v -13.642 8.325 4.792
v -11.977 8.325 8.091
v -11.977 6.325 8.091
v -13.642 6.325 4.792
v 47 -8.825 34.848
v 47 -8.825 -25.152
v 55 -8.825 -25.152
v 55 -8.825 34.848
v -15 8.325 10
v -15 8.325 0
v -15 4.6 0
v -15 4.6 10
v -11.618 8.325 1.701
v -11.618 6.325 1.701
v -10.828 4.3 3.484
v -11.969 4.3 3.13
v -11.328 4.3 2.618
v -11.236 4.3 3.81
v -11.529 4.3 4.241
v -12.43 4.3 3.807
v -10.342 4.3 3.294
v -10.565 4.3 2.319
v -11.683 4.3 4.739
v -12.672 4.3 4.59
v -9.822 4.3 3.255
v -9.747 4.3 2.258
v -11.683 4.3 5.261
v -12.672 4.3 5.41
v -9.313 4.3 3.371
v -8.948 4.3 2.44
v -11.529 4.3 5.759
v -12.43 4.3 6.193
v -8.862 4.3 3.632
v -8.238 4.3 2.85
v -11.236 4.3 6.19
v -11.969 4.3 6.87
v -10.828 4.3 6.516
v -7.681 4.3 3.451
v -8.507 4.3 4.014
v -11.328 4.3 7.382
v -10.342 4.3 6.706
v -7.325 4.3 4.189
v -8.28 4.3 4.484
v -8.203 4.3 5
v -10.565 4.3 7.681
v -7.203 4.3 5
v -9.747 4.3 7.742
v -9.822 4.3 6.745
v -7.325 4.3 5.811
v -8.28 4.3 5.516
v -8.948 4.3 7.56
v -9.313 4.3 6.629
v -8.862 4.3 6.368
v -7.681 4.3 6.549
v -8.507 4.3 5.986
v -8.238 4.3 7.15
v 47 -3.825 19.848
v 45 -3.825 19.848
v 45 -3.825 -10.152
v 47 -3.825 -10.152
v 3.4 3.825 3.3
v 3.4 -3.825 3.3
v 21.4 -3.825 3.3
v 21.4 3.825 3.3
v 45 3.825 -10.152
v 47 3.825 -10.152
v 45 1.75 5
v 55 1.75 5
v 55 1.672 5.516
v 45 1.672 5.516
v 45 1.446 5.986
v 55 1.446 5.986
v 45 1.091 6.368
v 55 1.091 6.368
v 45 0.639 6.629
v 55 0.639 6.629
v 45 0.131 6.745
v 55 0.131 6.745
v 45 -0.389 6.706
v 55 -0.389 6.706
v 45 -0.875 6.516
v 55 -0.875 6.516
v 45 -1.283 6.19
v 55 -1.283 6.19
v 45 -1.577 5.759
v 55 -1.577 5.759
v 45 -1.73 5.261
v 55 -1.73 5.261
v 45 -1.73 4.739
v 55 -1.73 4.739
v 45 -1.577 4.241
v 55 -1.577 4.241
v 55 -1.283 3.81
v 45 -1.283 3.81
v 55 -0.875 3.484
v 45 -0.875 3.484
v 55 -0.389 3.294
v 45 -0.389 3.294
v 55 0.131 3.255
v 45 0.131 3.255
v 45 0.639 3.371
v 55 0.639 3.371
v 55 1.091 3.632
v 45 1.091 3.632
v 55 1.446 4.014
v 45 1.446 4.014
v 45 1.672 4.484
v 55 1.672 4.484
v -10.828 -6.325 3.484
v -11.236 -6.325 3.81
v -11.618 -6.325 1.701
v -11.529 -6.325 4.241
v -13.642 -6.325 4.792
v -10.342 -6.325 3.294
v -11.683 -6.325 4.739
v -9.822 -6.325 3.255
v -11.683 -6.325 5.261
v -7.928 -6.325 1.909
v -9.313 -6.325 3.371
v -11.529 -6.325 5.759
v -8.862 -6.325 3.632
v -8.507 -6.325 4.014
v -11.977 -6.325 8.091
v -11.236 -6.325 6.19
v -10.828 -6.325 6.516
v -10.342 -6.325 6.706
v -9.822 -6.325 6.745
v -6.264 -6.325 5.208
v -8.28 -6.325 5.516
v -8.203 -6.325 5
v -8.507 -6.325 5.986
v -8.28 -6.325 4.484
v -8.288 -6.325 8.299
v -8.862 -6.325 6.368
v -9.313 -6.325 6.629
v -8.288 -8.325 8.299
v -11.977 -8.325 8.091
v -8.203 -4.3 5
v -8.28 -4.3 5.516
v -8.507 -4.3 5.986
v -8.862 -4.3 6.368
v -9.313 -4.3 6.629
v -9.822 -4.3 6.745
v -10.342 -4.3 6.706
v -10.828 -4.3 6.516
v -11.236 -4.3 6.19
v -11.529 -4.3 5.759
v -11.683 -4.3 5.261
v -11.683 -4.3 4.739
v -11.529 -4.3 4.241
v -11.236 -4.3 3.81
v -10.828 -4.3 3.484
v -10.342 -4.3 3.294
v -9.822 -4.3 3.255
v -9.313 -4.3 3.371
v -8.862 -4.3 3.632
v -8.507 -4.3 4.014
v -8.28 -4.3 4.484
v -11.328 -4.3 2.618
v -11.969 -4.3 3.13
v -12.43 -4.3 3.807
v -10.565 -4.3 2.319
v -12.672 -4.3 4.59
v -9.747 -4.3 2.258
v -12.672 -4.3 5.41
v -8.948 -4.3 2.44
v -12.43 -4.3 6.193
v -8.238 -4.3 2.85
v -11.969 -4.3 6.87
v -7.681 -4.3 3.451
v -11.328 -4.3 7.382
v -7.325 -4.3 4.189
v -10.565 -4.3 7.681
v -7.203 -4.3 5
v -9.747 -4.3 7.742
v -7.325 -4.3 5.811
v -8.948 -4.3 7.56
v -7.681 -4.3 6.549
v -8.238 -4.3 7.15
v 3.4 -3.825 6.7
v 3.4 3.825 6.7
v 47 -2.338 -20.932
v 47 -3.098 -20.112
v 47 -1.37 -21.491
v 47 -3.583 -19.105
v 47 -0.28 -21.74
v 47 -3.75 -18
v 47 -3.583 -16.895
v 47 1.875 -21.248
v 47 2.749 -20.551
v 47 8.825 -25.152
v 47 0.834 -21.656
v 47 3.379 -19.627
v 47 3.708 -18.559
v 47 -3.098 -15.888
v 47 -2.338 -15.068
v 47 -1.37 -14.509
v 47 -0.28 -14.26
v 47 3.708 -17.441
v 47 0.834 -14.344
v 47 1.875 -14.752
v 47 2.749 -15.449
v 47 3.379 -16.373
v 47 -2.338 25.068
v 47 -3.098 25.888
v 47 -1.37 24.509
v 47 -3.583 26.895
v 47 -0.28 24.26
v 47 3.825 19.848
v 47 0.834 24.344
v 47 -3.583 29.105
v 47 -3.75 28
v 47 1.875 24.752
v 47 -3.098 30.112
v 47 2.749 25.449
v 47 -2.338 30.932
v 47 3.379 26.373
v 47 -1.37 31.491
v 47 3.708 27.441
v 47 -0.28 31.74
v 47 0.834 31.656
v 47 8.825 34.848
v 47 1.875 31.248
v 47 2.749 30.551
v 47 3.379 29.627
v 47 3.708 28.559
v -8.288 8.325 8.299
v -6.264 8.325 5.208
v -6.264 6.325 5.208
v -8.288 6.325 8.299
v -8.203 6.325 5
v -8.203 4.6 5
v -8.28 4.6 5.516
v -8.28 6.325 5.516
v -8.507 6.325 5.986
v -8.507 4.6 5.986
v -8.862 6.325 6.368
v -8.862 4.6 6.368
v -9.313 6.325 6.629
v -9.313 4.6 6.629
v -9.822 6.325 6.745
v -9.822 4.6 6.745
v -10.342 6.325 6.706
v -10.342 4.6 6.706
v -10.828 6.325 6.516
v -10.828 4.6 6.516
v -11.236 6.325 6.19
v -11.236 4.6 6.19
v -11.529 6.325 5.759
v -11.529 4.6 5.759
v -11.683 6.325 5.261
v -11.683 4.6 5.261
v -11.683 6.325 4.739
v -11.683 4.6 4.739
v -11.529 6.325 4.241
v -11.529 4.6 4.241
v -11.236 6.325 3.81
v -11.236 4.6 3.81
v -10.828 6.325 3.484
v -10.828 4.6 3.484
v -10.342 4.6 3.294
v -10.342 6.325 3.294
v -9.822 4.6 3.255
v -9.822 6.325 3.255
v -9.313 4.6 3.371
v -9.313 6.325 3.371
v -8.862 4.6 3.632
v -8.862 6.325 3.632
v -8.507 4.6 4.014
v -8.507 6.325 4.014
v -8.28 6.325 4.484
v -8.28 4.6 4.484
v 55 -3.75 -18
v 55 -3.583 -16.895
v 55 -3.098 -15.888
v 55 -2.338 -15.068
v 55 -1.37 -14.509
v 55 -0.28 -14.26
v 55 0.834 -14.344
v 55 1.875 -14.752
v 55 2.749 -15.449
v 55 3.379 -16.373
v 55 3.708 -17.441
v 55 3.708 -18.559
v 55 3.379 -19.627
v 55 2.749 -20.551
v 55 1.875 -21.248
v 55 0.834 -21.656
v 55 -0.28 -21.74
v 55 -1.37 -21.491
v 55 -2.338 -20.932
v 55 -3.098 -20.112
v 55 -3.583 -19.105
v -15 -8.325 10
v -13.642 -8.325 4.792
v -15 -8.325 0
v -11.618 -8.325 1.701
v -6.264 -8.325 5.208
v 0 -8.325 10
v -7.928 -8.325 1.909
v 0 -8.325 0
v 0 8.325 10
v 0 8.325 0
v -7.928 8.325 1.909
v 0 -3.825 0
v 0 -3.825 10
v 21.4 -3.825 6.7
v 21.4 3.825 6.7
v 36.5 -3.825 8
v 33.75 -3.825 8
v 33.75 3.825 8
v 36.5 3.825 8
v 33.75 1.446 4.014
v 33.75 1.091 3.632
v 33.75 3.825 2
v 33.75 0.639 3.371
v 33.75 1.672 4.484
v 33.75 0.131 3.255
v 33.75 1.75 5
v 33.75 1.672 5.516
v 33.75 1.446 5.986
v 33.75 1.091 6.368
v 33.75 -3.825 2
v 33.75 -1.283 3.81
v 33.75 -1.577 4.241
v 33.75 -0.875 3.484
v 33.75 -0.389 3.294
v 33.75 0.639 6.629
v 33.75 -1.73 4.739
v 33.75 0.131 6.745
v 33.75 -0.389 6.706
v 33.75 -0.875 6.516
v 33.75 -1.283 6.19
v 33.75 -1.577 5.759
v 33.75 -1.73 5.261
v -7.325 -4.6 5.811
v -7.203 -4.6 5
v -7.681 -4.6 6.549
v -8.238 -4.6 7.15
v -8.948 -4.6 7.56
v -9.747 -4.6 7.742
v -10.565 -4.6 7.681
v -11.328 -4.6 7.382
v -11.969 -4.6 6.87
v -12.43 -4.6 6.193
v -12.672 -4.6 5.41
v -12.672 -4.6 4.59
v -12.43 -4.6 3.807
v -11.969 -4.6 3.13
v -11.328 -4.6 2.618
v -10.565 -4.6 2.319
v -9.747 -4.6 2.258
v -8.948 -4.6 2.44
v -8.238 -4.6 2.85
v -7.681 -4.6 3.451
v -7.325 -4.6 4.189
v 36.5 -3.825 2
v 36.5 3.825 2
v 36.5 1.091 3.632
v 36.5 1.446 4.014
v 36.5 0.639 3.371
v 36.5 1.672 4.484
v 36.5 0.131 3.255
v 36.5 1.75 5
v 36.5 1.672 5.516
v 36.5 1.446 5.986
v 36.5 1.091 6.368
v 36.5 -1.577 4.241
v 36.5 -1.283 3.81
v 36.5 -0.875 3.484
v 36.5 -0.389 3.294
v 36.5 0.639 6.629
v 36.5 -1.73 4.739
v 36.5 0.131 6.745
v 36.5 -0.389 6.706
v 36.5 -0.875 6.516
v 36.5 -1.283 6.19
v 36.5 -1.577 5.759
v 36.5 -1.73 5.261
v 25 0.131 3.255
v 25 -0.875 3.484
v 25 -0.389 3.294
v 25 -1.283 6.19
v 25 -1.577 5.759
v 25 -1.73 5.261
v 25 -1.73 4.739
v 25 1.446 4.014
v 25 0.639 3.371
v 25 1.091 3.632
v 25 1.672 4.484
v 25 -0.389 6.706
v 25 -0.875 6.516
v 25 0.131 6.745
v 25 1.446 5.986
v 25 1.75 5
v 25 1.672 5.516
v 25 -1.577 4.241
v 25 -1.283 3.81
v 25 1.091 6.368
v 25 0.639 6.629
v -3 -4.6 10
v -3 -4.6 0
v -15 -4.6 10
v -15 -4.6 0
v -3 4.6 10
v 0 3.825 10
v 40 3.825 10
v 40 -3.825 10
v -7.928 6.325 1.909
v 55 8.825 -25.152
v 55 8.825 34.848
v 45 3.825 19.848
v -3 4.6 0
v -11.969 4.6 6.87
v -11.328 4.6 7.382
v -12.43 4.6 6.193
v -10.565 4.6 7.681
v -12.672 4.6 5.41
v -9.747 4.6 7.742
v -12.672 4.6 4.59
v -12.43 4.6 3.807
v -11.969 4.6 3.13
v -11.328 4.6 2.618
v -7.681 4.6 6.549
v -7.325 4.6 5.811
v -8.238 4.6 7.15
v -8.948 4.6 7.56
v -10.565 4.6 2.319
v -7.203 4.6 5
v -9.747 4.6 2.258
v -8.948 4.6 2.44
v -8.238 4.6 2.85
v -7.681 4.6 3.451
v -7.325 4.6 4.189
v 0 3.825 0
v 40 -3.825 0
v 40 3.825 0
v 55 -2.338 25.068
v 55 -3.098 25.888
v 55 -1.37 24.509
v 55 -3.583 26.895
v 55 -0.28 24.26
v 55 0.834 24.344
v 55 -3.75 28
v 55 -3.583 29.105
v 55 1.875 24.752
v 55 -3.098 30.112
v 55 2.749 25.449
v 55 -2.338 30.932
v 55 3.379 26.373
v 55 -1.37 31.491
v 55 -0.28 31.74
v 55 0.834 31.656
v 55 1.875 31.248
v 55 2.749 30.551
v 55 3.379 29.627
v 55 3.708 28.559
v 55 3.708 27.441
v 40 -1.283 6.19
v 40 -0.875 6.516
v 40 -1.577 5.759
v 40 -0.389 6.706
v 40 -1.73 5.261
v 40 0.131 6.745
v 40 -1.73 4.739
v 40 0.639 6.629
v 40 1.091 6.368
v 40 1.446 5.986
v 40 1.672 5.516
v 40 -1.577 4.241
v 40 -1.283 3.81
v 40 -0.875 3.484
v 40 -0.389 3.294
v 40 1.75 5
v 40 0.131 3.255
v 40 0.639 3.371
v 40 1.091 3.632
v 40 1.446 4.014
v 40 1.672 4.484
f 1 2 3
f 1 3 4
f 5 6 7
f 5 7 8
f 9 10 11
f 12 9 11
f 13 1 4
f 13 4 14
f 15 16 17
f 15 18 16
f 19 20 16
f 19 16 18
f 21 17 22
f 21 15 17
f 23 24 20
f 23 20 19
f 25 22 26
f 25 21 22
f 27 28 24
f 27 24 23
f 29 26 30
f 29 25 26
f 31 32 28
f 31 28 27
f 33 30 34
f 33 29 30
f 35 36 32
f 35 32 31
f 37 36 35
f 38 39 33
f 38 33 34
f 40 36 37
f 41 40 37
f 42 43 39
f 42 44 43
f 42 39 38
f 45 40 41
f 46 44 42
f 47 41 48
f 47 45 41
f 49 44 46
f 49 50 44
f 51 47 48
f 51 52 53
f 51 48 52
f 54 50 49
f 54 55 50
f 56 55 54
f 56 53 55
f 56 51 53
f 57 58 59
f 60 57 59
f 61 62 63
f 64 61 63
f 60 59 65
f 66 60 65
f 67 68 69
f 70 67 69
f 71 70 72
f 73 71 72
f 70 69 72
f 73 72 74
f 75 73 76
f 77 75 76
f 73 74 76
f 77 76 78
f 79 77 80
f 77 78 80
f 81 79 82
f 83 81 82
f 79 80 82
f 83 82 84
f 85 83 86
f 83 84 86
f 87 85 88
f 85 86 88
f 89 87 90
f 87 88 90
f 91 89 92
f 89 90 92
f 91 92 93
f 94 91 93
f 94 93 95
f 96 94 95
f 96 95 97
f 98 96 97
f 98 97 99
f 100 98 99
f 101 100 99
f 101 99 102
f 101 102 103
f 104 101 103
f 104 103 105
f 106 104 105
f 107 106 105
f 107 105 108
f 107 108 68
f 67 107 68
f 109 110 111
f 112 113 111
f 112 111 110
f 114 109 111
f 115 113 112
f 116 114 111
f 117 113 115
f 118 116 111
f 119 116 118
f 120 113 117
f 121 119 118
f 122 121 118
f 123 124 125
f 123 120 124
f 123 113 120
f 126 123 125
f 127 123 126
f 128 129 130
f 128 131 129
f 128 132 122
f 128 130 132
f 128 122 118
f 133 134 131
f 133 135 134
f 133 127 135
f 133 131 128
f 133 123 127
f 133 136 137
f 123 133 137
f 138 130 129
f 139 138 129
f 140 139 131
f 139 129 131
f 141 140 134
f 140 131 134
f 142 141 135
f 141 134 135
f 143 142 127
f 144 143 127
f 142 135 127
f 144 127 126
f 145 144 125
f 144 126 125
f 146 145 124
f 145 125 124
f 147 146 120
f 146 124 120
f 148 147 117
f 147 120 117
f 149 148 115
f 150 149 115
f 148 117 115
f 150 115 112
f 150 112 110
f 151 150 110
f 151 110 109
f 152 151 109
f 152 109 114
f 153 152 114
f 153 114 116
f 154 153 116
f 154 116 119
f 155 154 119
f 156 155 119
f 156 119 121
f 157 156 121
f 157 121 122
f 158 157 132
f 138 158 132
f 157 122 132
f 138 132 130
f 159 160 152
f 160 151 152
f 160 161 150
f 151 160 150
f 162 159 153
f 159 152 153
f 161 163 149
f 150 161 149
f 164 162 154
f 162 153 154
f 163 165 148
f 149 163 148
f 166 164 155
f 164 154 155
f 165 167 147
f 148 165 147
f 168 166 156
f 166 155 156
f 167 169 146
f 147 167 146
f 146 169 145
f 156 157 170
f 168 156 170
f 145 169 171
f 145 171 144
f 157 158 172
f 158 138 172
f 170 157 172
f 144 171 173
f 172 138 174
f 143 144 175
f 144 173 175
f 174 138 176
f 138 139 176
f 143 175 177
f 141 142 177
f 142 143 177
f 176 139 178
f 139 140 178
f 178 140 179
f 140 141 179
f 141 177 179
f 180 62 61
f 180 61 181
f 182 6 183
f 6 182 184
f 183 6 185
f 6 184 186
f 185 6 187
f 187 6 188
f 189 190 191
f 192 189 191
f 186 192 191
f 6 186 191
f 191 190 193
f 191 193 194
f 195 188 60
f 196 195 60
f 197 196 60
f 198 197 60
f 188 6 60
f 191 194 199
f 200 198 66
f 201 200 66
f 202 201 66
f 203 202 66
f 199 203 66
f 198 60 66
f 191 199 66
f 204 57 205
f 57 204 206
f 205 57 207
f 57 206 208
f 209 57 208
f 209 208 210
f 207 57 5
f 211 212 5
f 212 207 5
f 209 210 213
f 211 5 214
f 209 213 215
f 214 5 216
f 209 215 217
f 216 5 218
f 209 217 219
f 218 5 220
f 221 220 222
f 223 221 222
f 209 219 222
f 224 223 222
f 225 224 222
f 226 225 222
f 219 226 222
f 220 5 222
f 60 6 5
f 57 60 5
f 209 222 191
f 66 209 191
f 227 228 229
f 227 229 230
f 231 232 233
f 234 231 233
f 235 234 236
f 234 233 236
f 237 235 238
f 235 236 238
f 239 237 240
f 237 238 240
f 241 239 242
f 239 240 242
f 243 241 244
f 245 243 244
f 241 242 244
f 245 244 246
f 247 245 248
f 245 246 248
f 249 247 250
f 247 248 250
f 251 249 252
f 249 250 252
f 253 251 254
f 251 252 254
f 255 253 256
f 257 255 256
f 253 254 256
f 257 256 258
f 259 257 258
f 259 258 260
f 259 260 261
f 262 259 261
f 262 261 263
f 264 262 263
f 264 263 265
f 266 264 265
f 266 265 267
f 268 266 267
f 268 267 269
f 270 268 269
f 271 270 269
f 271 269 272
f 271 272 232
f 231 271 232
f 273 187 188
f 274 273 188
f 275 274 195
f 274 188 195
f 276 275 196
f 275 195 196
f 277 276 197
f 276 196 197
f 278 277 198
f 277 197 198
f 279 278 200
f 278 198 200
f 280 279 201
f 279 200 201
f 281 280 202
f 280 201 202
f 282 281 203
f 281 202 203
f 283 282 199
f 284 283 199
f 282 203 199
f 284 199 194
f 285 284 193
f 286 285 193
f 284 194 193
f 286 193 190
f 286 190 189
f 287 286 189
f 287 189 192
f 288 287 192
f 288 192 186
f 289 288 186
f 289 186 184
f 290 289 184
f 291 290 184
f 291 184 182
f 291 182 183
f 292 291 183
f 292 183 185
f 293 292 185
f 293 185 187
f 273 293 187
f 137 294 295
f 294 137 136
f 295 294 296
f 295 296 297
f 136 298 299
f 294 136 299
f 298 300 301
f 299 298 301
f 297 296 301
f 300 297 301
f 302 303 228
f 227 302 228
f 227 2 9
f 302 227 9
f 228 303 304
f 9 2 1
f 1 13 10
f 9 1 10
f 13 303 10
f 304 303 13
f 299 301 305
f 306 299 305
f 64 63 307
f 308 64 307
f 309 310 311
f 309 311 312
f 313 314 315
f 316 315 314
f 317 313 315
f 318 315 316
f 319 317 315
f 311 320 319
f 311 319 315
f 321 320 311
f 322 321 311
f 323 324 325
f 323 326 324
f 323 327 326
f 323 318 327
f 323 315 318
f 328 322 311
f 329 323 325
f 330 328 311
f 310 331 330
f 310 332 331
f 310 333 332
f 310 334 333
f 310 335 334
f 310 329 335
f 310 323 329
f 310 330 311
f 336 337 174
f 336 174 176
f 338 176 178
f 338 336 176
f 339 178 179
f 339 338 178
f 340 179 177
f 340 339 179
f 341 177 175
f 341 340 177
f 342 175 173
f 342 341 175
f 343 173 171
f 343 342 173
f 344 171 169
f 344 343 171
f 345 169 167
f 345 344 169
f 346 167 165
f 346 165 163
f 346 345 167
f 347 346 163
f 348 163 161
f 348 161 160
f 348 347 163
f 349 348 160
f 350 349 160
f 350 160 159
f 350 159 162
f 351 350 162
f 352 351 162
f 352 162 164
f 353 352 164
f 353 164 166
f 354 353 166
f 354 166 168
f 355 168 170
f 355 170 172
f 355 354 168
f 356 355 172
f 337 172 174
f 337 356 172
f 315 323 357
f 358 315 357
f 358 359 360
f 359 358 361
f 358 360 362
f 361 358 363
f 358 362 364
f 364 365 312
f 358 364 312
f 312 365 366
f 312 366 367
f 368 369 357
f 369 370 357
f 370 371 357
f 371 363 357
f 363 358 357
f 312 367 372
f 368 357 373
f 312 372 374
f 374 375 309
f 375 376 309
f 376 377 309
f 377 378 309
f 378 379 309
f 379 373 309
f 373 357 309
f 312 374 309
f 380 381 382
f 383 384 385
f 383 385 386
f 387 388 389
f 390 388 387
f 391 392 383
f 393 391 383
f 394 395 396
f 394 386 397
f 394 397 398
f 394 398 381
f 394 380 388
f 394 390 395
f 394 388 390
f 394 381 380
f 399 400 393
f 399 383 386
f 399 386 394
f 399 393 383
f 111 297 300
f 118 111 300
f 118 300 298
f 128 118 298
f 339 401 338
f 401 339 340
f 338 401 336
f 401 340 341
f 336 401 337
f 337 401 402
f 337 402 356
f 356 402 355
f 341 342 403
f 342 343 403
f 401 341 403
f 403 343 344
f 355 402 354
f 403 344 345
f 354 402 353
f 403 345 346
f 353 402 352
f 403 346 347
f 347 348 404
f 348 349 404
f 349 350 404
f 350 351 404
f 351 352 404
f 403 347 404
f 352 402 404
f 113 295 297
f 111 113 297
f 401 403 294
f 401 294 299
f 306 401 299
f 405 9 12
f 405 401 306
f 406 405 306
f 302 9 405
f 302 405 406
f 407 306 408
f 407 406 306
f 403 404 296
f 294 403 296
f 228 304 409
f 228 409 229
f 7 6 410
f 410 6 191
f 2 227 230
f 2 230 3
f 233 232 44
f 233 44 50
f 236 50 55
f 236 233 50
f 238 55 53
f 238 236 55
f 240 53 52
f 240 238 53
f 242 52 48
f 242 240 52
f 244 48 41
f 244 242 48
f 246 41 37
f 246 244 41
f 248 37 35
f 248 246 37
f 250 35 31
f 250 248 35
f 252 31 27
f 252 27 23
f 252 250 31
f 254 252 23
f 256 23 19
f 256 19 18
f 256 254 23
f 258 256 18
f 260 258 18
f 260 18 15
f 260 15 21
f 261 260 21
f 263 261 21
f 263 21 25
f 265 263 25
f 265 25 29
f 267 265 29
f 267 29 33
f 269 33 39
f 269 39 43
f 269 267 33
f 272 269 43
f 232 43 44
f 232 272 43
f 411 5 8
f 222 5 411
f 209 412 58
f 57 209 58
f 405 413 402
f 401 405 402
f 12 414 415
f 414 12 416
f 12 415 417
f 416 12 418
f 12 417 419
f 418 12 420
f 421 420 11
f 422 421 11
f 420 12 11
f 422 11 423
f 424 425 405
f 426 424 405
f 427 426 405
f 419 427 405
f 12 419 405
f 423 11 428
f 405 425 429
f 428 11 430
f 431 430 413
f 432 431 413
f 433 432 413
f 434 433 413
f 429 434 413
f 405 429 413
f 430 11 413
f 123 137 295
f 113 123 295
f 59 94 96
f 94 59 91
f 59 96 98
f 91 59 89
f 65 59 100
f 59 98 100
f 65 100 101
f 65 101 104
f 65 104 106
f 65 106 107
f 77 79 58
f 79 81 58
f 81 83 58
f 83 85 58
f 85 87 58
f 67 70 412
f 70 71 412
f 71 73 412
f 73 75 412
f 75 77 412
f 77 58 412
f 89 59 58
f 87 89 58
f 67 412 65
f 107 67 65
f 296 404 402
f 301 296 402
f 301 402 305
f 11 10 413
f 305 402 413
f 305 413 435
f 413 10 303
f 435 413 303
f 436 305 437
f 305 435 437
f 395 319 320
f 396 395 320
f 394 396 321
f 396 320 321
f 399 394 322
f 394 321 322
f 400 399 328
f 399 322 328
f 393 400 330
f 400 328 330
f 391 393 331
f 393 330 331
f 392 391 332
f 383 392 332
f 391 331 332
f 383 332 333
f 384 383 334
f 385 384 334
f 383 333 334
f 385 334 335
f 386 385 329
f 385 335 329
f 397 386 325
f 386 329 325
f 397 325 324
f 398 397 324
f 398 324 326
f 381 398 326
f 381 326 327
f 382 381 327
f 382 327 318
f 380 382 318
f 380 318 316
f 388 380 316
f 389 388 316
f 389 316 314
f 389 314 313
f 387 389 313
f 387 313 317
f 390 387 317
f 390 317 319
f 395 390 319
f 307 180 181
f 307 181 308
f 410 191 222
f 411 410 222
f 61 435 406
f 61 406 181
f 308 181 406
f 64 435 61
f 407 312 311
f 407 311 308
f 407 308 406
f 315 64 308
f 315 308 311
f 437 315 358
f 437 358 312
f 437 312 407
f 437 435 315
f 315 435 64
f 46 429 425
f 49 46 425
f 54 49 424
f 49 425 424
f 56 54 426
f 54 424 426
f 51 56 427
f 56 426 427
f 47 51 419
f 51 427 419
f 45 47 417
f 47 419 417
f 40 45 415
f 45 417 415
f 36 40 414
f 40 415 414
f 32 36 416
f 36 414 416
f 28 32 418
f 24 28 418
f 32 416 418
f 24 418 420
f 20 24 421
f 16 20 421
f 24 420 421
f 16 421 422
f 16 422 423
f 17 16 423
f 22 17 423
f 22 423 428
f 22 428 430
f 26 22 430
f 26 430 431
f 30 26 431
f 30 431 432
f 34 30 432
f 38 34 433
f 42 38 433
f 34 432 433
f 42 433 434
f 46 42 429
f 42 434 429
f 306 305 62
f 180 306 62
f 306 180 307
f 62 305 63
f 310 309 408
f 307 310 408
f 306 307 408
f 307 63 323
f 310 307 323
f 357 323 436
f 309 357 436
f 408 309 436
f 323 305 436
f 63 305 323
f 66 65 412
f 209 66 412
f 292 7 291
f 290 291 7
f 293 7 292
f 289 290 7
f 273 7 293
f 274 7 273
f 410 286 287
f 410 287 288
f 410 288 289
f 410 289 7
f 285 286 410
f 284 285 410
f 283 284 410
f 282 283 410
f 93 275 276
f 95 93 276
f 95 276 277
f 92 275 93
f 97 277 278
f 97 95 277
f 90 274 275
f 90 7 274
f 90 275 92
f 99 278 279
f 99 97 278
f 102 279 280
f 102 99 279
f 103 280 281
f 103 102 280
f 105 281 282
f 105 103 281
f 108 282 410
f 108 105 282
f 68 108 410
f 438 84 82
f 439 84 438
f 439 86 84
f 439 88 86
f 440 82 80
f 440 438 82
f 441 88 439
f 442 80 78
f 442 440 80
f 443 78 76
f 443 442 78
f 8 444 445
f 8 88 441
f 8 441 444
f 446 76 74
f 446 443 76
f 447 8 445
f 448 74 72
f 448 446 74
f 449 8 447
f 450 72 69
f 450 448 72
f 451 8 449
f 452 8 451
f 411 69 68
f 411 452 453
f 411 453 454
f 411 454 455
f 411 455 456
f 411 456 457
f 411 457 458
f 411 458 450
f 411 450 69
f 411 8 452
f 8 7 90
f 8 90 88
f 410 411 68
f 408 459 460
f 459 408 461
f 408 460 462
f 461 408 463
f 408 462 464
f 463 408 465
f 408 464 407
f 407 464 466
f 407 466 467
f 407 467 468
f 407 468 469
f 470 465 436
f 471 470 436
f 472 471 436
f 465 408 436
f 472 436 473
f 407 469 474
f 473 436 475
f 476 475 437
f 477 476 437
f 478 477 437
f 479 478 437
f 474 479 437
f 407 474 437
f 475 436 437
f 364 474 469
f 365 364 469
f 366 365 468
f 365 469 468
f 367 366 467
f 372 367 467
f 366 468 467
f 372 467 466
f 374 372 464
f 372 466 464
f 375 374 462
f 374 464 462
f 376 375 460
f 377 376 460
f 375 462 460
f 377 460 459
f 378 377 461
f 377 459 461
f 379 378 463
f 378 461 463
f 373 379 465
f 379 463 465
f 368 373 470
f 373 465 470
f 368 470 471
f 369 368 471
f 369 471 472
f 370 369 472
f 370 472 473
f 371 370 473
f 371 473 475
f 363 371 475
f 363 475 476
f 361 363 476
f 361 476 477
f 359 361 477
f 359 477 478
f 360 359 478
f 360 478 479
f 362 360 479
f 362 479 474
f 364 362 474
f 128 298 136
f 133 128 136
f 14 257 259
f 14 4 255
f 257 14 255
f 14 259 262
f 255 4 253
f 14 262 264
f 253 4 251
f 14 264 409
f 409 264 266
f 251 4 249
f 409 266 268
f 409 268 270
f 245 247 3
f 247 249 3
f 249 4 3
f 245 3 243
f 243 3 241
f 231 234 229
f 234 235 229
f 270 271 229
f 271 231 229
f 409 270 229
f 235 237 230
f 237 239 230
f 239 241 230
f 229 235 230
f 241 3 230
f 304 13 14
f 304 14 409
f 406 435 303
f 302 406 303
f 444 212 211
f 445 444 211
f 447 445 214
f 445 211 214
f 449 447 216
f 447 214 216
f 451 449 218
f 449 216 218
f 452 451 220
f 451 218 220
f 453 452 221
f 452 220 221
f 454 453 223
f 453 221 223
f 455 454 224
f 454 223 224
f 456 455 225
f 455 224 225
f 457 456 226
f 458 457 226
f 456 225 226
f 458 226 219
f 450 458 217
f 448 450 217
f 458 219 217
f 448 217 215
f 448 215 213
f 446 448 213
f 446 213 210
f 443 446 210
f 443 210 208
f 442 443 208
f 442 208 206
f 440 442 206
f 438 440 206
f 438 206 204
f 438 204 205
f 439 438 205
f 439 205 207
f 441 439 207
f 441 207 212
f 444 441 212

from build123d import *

# Parameters (mm, degrees)
F0_W      = 40
F0_H      = 3.825
F1_DEPTH  = 10
F2_R      = 1.75
F3_DEPTH  = 16.651
F4_W      = 18
F4_H      = 3.4
F4_W_2    = 2.75
F4_H_2    = 6
F5_DEPTH  = 12.151
F6_R      = 1.75
F7_DEPTH  = 15
F10_DEPTH = 2
F11_W     = 17.65
F11_H     = 60
F12_DEPTH = 8
F13_R     = 1.75
F14_DEPTH = 70.001
F15_R     = 2.75
F15_R_2   = 1.75
F16_DEPTH = 0.3
F17_R     = 1.75
F18_DEPTH = 2
F19_R     = 3.75
F20_DEPTH = 15


# Not quite as in the source:
# - a pattern or mirror of a feature is missing from the dataset's text; its kind, count and spacing are read off the source's solid


with BuildPart() as f1:
    # F0 (on Top) → F1 (new body)
    with BuildSketch(Plane.XY):
        Polygon((0, -3.825), (0, 0), (-3, 0), (-3, -4.6), (-15, -4.6), (-15, -8.325), (0, -8.325), align=None)
        Polygon((-3, 0), (0, 0), (0, 3.825), (0, 8.325), (-15, 8.325), (-15, 4.6), (-3, 4.6), align=None)
        with Locations((20, 1.9125)):
            Rectangle(F0_W, F0_H)
        with Locations((20, -1.9125)):
            Rectangle(F0_W, F0_H)
    extrude(amount=F1_DEPTH)

    # F2 (on face) → F3 (cut, through all)
    with BuildSketch(Plane.XZ.offset(8.325)):
        with Locations((-9.9527407438, 5)):
            Circle(F2_R)
    extrude(amount=-F3_DEPTH, mode=Mode.SUBTRACT)

    # F4 (on face) → F5 (cut, through all)
    with BuildSketch(Plane.XZ.offset(3.825)):
        with Locations((12.4002694301, 5)):
            Rectangle(F4_W, F4_H)
        with Locations((35.125, 5)):
            Rectangle(F4_W_2, F4_H_2)
    extrude(amount=-F5_DEPTH, mode=Mode.SUBTRACT)

    # F6 (on face) → F7 (cut)
    with BuildSketch(Plane.YZ.offset(40)):
        with Locations((0, 5)):
            Circle(F6_R)
    extrude(amount=-F7_DEPTH, mode=Mode.SUBTRACT)

    # F15 (on face) → F16 (join)
    with BuildSketch(Plane.XZ.offset(-4.6)):
        with Locations((-9.9527407438, 5)):
            Circle(F15_R)
        with Locations((-9.9527407438, 5)):
            Circle(F15_R_2, mode=Mode.SUBTRACT)
    f16 = extrude(amount=F16_DEPTH)

    # F16_copies: F16 across plane
    add(f16.mirror(Plane(origin=(0, 0, 0), x_dir=(0, 0, -1), z_dir=(0, -1, 0))))

    # F17 (on face) → F18 (cut)
    with BuildSketch(Plane.XZ.offset(8.325)):
        Polygon((-7.9284293953, 1.9088033227), (-6.2635302189, 5.2075067143), (-8.2878415673, 8.2987033916), (-11.9770520922, 8.0911966773), (-13.6419512686, 4.7924932857), (-11.6176399202, 1.7012966084), align=None)
        with Locations((-9.9527407438, 5)):
            Circle(F17_R, mode=Mode.SUBTRACT)
    f18 = extrude(amount=-F18_DEPTH, mode=Mode.SUBTRACT)

    # F18_copies: F18 across plane
    add(f18.mirror(Plane.ZX), mode=Mode.SUBTRACT)


with BuildPart() as f10:
    # F9 (on offset) → F10 (new body)
    with BuildSketch(Plane.YZ.offset(45)):
        Polygon((3.825, 0), (3.825, 10), (3.825, 19.8484882712), (-3.825, 19.8484882712), (-3.825, 10), (-3.825, 0), (-3.825, -10.1515117288), (3.825, -10.1515117288), align=None)
    extrude(amount=F10_DEPTH)

    # F11 (on face) → F12 (join)
    with BuildSketch(Plane.YZ.offset(47)):
        with Locations((0, 4.8484882712)):
            Rectangle(F11_W, F11_H)
    extrude(amount=F12_DEPTH)

    # F13 (on face) → F14 (cut, through all)
    with BuildSketch(Plane.YZ.offset(55)):
        with Locations((0, 5)):
            Circle(F13_R)
    extrude(amount=-F14_DEPTH, mode=Mode.SUBTRACT)

    # F19 (on face) → F20 (cut)
    with BuildSketch(Plane(origin=(47, 0, 0), x_dir=(0, -1, 0), z_dir=(-1, 0, 0))):
        with Locations((0, 28)):
            Circle(F19_R)
        with Locations((0, -18)):
            Circle(F19_R)
    extrude(amount=-F20_DEPTH, mode=Mode.SUBTRACT)


solid = Compound([f1.part, f10.part])
